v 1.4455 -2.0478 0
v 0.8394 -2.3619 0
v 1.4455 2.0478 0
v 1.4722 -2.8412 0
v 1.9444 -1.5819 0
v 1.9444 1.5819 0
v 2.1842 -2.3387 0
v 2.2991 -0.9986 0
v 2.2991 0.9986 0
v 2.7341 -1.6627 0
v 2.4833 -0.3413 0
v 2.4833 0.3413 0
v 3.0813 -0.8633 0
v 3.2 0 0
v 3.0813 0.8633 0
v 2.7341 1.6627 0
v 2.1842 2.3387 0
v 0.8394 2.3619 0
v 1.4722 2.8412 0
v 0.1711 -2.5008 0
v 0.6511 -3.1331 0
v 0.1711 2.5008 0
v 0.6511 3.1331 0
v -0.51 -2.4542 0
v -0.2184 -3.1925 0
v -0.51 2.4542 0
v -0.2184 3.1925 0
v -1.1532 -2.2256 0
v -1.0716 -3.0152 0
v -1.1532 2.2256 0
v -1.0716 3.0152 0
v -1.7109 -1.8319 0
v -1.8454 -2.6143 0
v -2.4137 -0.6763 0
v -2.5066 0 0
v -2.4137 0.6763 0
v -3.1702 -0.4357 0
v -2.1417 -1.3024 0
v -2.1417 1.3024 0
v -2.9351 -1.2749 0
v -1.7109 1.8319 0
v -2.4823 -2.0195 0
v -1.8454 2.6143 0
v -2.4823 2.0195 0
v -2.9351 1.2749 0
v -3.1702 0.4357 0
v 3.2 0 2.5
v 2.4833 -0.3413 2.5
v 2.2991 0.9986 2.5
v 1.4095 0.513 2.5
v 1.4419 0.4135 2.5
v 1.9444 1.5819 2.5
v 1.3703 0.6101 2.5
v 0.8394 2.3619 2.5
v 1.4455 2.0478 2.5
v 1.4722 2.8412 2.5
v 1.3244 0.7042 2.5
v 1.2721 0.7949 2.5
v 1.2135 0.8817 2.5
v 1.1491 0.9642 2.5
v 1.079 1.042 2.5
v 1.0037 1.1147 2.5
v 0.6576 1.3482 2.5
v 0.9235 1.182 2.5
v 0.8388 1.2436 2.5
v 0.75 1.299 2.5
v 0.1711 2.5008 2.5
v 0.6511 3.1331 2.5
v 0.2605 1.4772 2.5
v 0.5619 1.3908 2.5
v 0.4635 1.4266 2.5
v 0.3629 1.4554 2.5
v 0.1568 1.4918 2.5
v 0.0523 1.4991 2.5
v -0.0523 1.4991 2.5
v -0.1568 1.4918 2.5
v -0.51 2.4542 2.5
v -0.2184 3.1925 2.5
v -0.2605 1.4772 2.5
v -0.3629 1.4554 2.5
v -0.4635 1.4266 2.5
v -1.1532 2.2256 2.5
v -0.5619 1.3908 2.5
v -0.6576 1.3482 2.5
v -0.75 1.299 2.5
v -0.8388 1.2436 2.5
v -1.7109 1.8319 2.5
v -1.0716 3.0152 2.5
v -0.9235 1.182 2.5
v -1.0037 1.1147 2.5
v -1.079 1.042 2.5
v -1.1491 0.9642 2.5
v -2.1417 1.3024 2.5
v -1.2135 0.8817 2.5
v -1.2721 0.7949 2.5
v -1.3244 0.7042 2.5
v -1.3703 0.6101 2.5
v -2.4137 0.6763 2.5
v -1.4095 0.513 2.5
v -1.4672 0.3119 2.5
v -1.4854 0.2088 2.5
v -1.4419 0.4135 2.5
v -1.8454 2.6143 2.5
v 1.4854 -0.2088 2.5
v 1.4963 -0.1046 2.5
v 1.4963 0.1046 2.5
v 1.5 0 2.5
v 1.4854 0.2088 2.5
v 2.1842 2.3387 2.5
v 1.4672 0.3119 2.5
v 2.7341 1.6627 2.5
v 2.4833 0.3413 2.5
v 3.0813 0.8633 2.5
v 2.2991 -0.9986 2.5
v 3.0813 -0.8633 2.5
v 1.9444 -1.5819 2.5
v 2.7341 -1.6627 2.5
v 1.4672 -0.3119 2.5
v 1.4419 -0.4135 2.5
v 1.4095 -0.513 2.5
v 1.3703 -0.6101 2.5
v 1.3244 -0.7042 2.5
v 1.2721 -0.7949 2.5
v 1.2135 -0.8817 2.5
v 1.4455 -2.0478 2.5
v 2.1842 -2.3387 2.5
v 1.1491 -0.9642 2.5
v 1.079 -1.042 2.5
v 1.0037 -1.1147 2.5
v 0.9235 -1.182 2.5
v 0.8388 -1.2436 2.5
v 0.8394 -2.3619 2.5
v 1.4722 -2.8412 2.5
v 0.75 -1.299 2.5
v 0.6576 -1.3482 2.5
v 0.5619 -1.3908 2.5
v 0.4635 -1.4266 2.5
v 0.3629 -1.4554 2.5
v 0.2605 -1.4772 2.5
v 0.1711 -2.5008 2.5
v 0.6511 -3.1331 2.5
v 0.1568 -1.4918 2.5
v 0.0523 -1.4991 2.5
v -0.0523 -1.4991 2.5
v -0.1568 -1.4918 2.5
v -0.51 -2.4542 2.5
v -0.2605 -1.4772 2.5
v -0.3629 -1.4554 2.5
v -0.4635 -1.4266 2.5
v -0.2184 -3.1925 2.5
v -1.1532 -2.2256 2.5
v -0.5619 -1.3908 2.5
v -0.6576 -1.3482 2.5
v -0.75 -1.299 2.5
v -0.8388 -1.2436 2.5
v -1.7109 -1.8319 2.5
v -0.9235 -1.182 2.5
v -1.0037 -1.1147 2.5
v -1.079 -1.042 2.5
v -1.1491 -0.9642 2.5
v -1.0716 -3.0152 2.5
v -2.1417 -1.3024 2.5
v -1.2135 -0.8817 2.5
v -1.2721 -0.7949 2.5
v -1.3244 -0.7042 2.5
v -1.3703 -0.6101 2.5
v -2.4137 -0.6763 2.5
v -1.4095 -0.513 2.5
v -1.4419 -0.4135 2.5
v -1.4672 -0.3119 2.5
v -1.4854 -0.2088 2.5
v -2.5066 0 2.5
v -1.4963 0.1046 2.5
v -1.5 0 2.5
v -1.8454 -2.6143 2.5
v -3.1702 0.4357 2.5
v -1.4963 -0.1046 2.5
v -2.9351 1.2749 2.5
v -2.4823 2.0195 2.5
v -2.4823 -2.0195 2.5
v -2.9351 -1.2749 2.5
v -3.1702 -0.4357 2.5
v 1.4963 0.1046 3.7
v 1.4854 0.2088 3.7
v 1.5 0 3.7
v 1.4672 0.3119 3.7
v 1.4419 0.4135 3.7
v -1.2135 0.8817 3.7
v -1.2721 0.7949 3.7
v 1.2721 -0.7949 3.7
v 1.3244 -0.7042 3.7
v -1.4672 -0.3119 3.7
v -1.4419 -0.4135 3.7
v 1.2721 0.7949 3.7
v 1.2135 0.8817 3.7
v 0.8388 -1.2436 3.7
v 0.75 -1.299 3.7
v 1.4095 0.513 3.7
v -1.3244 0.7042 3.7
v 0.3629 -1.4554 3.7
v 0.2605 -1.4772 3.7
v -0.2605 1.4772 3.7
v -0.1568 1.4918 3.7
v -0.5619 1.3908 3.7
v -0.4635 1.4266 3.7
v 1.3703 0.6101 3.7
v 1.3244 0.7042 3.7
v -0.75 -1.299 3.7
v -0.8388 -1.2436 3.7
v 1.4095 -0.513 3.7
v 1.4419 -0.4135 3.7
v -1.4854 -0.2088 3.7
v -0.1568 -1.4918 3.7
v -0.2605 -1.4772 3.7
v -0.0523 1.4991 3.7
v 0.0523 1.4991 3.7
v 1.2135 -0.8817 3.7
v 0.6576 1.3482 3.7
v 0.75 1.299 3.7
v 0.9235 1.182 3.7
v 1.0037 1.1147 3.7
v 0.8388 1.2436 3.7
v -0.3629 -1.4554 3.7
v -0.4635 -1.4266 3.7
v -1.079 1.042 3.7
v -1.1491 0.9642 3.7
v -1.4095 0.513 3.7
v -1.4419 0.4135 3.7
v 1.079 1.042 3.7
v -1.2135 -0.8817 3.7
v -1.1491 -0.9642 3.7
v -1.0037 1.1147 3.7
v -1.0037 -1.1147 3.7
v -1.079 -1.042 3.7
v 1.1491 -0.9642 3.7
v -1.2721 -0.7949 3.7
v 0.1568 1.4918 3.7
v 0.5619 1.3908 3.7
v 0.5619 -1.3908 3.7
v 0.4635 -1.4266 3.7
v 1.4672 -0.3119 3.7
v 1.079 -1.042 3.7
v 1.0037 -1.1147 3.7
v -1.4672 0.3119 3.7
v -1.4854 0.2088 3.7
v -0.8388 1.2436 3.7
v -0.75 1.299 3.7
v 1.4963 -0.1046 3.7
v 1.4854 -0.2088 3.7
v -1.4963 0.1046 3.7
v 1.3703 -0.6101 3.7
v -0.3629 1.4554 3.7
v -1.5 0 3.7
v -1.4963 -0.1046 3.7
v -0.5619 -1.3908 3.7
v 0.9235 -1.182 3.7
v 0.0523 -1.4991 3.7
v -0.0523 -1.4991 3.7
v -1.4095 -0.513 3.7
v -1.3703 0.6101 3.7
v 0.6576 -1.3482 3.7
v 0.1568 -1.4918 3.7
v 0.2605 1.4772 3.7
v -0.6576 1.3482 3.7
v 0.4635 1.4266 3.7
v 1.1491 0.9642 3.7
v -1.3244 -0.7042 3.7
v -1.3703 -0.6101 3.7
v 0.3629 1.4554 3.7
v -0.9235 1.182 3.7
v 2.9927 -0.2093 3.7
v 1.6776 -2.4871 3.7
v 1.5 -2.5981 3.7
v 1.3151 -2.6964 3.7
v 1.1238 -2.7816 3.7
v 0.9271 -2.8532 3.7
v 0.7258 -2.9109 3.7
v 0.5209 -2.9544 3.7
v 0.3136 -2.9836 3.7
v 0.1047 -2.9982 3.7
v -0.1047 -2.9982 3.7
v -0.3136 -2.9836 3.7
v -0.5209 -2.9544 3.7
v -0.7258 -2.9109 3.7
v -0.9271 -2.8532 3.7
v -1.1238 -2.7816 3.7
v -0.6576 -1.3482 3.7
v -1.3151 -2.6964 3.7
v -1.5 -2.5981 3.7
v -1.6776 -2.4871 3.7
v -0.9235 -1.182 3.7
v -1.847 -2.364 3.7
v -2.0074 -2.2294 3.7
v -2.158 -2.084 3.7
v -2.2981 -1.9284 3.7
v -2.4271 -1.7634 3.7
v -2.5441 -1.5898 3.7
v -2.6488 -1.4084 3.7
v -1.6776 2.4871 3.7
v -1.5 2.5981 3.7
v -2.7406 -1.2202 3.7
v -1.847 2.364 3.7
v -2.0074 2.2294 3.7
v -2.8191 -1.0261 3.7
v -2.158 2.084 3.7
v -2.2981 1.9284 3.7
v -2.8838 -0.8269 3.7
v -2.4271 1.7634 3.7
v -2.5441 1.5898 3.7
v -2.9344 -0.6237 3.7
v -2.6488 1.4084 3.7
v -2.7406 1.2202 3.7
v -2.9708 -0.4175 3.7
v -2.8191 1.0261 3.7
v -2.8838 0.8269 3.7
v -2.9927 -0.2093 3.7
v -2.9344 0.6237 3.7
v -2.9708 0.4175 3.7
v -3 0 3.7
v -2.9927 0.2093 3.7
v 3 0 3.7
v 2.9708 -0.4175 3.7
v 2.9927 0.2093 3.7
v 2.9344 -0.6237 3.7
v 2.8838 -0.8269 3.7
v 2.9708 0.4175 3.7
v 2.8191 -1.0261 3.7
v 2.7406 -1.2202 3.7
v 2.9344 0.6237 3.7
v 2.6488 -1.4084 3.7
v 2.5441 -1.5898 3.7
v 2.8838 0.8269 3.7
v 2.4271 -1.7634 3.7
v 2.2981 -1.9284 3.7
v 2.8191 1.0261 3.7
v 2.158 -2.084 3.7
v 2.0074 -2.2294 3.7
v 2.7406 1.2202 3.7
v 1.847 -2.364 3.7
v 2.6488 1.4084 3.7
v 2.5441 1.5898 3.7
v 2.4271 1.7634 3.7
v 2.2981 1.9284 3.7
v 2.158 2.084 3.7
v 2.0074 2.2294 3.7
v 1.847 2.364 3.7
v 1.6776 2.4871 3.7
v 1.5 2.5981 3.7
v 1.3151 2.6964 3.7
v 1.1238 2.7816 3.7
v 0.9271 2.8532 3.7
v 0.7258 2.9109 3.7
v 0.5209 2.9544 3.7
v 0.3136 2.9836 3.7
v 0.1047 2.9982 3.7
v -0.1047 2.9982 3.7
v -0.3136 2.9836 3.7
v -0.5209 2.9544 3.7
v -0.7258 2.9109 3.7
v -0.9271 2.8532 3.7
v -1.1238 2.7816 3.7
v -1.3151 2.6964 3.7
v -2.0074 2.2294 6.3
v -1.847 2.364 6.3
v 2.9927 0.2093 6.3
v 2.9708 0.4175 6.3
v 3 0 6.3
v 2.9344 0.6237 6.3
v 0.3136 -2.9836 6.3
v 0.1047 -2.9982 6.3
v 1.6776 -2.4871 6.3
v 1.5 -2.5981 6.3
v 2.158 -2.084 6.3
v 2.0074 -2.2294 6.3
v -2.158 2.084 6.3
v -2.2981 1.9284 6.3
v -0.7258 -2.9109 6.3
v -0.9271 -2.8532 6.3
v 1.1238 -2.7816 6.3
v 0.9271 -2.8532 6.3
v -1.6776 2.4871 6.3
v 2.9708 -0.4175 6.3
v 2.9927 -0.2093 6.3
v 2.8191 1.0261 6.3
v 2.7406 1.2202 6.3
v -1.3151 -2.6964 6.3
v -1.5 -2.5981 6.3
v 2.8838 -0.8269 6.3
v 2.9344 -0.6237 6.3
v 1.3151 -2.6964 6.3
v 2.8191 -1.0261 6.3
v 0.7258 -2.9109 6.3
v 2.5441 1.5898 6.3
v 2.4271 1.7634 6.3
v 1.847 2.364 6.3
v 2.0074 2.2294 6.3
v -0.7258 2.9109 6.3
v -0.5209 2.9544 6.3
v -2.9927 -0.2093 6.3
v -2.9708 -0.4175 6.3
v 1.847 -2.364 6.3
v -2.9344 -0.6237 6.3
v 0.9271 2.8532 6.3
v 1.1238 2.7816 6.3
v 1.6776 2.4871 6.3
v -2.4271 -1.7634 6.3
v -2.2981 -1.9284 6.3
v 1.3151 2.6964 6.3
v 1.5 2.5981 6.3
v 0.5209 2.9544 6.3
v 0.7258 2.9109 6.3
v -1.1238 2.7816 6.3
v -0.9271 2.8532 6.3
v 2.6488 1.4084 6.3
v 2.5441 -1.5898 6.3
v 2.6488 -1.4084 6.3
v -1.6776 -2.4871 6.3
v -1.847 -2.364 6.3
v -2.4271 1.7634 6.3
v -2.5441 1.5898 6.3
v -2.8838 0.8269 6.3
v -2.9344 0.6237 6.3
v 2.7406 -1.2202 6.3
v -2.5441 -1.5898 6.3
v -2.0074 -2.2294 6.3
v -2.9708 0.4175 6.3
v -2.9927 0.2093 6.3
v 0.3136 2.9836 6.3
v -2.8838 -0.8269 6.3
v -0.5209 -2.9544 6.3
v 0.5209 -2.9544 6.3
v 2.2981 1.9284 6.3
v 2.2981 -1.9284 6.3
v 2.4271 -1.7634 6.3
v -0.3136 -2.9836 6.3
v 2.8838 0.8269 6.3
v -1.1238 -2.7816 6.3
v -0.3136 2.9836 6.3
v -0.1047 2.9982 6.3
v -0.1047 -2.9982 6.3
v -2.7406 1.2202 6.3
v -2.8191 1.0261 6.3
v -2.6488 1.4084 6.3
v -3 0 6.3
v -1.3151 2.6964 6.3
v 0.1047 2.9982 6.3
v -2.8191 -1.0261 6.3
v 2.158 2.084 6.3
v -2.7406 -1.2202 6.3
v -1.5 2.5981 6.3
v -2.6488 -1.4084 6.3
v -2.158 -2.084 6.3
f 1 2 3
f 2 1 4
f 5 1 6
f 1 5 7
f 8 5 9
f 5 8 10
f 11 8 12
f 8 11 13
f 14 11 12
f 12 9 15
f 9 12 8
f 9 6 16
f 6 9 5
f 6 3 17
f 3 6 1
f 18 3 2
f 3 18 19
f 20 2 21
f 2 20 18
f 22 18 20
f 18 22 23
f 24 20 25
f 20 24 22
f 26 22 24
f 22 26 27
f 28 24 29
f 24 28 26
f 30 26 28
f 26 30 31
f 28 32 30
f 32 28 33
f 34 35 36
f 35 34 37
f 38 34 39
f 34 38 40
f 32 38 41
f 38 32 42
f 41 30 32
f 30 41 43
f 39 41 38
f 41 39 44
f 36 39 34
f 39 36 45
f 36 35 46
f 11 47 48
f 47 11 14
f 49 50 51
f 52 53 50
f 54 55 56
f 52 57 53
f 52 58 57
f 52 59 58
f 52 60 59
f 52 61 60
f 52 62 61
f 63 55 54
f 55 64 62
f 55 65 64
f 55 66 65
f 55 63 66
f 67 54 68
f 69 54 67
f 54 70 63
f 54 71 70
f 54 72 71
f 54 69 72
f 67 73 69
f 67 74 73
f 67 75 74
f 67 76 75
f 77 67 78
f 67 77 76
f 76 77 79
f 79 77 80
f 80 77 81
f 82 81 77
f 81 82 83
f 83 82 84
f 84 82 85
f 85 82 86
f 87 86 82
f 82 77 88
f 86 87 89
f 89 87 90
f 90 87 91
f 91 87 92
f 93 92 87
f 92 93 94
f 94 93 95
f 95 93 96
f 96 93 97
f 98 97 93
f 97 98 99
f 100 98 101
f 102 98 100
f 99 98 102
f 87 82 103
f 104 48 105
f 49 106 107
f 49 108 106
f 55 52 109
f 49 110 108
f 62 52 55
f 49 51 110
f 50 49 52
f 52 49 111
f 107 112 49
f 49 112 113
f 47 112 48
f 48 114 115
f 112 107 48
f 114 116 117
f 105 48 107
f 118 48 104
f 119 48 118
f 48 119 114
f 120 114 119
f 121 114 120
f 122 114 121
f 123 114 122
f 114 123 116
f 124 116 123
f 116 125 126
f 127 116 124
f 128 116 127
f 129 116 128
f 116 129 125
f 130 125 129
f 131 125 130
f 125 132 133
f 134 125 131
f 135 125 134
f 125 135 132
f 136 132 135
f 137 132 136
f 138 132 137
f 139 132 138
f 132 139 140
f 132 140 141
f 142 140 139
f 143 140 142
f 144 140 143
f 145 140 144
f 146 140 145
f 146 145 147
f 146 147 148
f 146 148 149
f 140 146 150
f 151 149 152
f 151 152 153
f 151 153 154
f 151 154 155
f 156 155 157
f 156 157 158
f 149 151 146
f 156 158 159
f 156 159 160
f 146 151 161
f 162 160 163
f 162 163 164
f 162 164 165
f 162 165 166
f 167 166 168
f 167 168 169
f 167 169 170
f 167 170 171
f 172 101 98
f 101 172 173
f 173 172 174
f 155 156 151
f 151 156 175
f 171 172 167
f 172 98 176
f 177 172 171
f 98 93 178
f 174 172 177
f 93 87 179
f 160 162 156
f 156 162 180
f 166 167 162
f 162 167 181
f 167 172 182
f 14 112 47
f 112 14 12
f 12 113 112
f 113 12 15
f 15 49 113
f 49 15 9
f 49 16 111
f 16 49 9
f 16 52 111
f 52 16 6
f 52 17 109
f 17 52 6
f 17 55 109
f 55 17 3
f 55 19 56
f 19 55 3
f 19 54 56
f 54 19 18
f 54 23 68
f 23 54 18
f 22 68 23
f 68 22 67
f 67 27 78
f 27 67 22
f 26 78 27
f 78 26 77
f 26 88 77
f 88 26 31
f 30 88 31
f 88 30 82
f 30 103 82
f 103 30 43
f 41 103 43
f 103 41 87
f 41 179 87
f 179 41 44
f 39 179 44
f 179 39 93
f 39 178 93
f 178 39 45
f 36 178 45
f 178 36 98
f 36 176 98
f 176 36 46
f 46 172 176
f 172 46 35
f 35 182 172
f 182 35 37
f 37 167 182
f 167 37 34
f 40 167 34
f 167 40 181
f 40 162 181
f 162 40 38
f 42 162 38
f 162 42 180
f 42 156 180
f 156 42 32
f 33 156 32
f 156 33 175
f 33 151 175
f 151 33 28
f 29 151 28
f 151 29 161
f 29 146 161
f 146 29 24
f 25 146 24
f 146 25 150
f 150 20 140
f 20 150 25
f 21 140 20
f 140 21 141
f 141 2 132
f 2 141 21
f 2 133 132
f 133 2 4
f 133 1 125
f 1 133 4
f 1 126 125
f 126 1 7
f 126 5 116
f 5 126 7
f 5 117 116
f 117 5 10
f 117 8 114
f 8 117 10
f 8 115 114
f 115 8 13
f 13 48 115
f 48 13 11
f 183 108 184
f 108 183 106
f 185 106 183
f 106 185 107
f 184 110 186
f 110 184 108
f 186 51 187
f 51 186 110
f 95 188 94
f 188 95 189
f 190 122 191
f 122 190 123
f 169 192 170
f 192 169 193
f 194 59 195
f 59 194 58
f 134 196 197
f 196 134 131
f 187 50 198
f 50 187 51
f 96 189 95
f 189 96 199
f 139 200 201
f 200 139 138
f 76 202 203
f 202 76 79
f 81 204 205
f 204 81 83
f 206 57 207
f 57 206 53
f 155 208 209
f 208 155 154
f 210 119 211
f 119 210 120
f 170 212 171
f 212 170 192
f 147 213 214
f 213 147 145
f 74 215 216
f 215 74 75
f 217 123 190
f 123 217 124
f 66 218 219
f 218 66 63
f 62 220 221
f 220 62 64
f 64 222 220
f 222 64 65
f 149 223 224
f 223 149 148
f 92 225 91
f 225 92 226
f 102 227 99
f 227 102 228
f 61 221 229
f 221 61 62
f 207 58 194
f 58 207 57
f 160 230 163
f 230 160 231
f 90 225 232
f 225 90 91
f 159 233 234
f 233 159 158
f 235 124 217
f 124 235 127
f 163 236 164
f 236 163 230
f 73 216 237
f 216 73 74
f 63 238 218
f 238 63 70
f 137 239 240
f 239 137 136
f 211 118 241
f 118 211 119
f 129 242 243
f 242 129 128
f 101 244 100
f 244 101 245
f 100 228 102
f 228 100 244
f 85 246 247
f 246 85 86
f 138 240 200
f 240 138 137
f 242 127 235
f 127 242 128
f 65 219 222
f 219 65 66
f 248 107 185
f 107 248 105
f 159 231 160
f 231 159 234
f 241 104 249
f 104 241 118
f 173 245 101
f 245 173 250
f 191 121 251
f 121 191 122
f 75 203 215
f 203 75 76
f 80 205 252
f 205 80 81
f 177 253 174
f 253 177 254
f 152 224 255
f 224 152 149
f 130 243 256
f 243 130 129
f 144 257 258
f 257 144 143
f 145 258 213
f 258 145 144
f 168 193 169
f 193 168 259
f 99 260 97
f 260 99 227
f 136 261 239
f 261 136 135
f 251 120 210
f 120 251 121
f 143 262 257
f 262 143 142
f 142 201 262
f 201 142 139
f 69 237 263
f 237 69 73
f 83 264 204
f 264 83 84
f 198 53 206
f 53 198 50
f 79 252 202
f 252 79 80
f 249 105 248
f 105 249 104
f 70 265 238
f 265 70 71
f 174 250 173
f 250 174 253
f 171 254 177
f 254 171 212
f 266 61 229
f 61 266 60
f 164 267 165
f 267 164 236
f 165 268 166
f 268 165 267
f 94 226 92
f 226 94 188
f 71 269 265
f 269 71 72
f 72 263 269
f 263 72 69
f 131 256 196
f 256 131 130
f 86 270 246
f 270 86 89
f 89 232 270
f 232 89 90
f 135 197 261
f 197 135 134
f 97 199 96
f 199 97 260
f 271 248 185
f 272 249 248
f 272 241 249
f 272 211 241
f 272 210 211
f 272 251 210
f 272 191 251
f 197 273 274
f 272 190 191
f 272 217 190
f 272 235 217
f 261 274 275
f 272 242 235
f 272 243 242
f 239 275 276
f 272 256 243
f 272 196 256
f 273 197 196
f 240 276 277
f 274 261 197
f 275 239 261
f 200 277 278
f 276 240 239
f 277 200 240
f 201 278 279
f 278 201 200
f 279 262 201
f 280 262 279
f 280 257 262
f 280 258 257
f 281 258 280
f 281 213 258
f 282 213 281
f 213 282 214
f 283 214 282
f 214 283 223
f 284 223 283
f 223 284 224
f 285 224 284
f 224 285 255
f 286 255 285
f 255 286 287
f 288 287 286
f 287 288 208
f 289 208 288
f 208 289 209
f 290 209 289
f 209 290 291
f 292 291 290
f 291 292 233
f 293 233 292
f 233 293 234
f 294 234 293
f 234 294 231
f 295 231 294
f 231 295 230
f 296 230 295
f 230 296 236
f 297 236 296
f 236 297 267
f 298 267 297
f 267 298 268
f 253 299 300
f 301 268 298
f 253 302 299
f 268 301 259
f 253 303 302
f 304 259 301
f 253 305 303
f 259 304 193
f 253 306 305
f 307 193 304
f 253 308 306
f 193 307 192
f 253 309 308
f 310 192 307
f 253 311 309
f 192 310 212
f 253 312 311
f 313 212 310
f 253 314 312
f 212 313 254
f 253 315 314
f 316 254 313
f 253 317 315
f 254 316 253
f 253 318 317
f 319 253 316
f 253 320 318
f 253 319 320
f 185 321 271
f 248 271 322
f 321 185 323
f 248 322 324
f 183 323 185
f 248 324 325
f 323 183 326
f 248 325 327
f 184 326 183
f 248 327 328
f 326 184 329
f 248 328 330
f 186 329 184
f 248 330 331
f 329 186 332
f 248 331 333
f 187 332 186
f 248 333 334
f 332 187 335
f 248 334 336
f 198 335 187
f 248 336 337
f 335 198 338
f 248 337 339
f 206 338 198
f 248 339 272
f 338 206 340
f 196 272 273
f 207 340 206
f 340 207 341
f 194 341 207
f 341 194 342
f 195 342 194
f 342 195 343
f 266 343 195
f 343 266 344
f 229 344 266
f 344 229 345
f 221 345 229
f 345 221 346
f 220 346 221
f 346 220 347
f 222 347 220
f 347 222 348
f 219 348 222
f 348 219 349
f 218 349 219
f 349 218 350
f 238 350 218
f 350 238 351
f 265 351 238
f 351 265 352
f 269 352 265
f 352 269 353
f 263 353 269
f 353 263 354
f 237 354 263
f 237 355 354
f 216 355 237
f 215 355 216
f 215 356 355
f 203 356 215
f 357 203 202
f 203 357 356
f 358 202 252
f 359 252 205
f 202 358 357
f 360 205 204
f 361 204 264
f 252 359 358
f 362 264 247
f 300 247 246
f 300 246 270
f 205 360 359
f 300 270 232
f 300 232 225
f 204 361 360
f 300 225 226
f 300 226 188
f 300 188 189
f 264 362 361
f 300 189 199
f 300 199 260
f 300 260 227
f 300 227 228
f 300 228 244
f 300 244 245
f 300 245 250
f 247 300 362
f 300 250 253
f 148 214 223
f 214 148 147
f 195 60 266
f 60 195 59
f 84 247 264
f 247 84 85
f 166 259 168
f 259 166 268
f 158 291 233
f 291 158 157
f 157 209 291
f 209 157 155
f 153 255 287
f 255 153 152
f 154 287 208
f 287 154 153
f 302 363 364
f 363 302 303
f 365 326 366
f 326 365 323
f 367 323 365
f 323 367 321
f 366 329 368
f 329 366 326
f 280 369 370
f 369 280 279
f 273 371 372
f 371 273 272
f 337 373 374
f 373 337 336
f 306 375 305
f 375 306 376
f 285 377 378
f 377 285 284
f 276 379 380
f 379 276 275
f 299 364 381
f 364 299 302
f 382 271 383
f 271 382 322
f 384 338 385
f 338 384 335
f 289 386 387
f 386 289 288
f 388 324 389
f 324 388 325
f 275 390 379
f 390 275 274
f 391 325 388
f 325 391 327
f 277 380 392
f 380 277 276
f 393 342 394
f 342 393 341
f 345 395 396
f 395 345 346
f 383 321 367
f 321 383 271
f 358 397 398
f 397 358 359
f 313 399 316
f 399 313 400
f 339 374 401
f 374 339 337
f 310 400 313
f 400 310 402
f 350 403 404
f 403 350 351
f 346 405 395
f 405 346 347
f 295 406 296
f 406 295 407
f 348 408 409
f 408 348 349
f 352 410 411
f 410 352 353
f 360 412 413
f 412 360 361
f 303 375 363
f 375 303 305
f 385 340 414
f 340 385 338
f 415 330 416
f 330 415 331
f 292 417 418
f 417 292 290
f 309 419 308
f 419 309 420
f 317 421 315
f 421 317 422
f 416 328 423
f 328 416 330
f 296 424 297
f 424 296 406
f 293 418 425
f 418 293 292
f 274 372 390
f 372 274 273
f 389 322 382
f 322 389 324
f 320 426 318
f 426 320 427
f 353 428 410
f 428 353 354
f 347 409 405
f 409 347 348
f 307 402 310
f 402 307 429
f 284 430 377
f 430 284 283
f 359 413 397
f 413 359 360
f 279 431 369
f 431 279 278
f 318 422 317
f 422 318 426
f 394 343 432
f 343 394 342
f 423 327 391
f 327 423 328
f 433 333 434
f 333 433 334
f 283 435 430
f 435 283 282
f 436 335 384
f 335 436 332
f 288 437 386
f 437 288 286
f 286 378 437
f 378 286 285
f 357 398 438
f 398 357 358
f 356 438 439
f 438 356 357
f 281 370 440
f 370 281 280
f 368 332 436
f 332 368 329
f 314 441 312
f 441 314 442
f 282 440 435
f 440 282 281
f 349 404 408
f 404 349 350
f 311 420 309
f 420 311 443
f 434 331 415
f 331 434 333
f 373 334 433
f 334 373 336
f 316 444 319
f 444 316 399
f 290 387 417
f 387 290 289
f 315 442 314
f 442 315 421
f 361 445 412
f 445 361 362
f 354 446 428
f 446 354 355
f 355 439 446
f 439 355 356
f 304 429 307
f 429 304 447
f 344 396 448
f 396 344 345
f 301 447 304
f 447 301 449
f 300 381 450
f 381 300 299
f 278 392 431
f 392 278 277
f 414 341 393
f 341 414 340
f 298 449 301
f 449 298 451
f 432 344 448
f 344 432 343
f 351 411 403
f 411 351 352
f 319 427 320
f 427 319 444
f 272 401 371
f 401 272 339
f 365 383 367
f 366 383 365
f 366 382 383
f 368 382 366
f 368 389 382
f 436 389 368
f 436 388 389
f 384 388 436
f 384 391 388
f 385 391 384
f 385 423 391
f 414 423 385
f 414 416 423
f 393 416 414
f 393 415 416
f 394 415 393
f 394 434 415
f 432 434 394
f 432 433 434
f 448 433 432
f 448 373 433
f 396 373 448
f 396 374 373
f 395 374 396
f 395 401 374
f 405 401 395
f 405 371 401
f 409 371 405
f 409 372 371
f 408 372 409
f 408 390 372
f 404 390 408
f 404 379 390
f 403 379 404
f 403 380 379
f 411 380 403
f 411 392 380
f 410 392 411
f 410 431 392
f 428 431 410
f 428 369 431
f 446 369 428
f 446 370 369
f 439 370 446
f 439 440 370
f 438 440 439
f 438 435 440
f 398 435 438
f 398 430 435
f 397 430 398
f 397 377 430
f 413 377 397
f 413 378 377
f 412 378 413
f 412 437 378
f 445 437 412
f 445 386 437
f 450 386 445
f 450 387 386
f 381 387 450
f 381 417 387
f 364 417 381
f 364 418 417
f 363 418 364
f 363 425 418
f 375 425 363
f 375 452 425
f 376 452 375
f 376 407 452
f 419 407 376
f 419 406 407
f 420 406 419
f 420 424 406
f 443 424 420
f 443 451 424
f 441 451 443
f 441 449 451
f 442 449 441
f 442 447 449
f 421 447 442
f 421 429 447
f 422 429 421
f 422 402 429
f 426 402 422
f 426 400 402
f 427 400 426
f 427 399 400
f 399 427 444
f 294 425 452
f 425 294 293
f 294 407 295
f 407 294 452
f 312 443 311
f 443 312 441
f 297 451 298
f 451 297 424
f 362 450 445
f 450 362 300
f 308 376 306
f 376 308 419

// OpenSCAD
#servoAxisFit();

module servoAxisFit(){
	toothAngle = 360/23;
	
	cylinder(d=3, h=3.7, $fn=90);
	translate([0, 0, 3.7])
		cylinder(d=6, h=2.6, $fn=90);
	
	for(angle = [0:toothAngle:360])
		rotate([0, 0, angle])
			linear_extrude(2.5)
				tooth();
	
	module tooth(){
		triangle();
		rotate([180, 0, 0])
			triangle();
	}

	module triangle(){
		angleOverlap = 0.1;
		angle = toothAngle/2 + angleOverlap;
		innerRadius = 2.5;
		height = innerRadius * sin(angle);
		a = innerRadius * cos(angle);
		polygon([[0,0], [3.2,0], [a,height]]);
	}
}
